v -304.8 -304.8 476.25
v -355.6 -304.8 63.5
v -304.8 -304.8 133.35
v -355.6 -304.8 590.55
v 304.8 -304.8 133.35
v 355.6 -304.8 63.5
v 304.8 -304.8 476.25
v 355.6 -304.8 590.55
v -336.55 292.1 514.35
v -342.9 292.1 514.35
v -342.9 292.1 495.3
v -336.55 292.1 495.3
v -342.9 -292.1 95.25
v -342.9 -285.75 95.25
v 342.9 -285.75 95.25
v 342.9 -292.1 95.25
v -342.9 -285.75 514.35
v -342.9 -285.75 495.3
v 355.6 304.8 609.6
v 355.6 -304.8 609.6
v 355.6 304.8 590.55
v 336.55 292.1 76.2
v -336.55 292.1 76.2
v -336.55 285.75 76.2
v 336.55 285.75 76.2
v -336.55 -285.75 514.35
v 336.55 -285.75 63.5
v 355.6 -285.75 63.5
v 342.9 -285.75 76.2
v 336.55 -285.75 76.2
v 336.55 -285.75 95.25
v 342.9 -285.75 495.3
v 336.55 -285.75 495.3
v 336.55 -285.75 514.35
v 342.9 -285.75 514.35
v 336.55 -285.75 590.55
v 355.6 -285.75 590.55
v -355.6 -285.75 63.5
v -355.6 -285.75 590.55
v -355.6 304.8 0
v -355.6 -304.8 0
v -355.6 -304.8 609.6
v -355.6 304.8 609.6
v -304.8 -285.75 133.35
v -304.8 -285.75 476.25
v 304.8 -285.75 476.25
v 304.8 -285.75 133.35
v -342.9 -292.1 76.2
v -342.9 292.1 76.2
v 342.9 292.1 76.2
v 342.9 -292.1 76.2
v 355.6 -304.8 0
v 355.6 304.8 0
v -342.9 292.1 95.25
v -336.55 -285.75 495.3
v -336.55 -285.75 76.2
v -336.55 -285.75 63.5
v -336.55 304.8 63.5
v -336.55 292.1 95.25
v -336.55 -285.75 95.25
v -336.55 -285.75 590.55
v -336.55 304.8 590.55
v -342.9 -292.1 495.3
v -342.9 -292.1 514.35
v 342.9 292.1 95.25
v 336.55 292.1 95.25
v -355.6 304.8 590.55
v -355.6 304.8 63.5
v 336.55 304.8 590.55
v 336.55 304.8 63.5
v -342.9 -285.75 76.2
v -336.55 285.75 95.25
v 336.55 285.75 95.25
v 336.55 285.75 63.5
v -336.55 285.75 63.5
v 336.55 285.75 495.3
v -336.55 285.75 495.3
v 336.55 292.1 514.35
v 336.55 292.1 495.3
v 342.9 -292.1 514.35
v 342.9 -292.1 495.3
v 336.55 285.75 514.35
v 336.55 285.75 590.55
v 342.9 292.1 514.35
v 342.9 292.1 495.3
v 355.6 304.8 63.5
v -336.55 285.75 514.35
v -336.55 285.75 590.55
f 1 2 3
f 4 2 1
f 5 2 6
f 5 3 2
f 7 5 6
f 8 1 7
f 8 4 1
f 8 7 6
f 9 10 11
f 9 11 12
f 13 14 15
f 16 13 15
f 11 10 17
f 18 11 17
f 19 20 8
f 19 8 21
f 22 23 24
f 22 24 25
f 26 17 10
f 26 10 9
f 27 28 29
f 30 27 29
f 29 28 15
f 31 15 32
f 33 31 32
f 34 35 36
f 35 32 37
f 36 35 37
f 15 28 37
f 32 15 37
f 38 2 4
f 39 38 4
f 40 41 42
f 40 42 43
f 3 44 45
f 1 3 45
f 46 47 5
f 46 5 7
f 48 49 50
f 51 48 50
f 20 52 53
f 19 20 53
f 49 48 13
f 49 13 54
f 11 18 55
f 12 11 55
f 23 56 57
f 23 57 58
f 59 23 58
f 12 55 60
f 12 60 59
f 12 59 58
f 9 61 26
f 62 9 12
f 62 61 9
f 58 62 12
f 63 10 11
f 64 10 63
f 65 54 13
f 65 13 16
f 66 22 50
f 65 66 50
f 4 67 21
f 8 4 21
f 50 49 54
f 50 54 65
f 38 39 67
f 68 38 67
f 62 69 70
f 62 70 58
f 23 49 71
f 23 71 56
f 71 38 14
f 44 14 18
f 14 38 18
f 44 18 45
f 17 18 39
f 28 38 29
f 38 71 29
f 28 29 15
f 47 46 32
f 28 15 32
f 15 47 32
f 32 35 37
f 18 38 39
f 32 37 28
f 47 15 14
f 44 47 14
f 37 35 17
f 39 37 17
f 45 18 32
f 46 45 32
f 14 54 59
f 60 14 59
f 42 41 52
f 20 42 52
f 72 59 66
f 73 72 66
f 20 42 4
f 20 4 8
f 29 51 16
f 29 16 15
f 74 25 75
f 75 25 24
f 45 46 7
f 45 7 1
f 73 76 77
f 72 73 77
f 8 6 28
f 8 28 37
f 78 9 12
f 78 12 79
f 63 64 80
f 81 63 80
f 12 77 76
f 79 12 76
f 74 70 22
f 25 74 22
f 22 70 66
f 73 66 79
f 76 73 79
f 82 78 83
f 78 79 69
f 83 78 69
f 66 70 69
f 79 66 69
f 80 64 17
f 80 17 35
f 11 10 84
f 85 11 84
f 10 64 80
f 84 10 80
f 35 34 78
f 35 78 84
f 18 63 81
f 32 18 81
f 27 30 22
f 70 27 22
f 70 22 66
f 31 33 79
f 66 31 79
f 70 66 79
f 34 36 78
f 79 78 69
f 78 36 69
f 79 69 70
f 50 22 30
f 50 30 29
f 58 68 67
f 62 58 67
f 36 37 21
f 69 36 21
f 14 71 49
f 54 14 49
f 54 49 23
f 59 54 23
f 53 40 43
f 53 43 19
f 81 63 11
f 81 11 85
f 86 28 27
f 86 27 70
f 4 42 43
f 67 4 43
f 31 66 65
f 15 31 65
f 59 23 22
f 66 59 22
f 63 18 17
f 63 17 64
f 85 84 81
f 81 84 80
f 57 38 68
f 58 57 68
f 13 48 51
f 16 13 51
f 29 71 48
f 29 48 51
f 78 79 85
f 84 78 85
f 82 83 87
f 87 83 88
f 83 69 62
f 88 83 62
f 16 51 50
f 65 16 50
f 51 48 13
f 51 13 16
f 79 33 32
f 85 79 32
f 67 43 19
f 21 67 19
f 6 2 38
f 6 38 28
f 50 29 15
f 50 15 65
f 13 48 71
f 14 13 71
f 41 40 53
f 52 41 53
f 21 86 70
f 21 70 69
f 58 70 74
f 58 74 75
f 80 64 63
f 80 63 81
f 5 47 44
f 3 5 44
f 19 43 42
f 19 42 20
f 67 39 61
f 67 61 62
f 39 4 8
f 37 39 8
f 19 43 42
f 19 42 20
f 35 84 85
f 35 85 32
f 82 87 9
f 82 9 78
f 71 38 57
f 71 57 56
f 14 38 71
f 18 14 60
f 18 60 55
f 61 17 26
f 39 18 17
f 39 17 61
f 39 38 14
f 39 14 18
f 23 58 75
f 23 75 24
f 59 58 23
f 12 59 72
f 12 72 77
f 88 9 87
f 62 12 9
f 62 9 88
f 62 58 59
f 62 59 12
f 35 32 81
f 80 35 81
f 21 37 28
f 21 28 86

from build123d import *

# Parameters (mm, degrees)
F0_W      = 711.2
F0_H      = 609.6
F1_DEPTH  = 609.6
F2_W      = 711.2
F2_H      = 609.6
F3_DEPTH  = 19.05
F4_W      = 590.55
F4_H      = 527.05
F5_DEPTH  = 19.05
F7_W      = 711.2
F7_H      = 527.05
F8_DEPTH  = 19.05
F9_W      = 673.1
F9_H      = 527.05
F10_DEPTH = 19.05
F12_W     = 685.8000246048
F12_H     = 584.2000246048
F12_W_2   = 673.1
F12_H_2   = 571.5
F13_DEPTH = 19.05
F15_W     = 685.8
F15_H     = 584.2
F16_DEPTH = 19.05
F17_W     = 609.6
F17_H     = 342.9
F18_DEPTH = 19.05


with BuildPart() as f1:
    # F0 (on Top) → F1 (new body)
    with BuildSketch(Plane.XY):
        Rectangle(F0_W, F0_H)
    extrude(amount=F1_DEPTH)


with BuildPart() as f3:
    # F2 (on face) → F3 (new body)
    with BuildSketch(Plane.XY.offset(609.6)):
        Rectangle(F2_W, F2_H)
    extrude(amount=-F3_DEPTH)


with BuildPart() as f5:
    # F4 (on face) → F5 (new body)
    with BuildSketch(Plane.YZ.offset(355.6)):
        with Locations((9.525, 327.025)):
            Rectangle(F4_W, F4_H)
    extrude(amount=-F5_DEPTH)


with BuildPart() as f6_1:
    # F6: instance of F5
    add(f5.part.mirror(Plane.YZ))


with BuildPart() as f8:
    # F7 (on face) → F8 (new body)
    with BuildSketch(Plane.XZ.offset(304.8)):
        with Locations((0, 327.025)):
            Rectangle(F7_W, F7_H)
    extrude(amount=-F8_DEPTH)

    # F17 (on face) → F18 (cut, through all)
    with BuildSketch(Plane(origin=(0, -285.75, 0), x_dir=(-1, 0, 0), z_dir=(0, 1, 0))):
        with Locations((0, 304.8)):
            Rectangle(F17_W, F17_H)
    extrude(amount=-F18_DEPTH, mode=Mode.SUBTRACT)


with BuildPart() as f10:
    # F9 (on face) → F10 (new body)
    with BuildSketch(Plane(origin=(0, 304.8, 0), x_dir=(-1, 0, 0), z_dir=(0, 1, 0))):
        with Locations((0, 327.025)):
            Rectangle(F9_W, F9_H)
    extrude(amount=-F10_DEPTH)


with BuildPart() as f13:
    # F12 (on offset) → F13 (new body)
    with BuildSketch(Plane.XY.offset(76.2)):
        Rectangle(F12_W, F12_H)
        Rectangle(F12_W_2, F12_H_2, mode=Mode.SUBTRACT)
        Rectangle(F12_W_2, F12_H_2)
    extrude(amount=F13_DEPTH)


with BuildPart() as f16:
    # F15 (on offset) → F16 (new body)
    with BuildSketch(Plane(origin=(0, 0, 514.35), x_dir=(1, 0, 0), z_dir=(0, 0, -1))):
        Rectangle(F15_W, F15_H)
    extrude(amount=F16_DEPTH)


with BuildPart() as f10_1:
    add(f10.part)

    # F19: cut F13
    add(f13.part, mode=Mode.SUBTRACT)

    # F20: cut F16
    add(f16.part, mode=Mode.SUBTRACT)


with BuildPart() as f6_1_1:
    add(f6_1.part)

    # F19: cut F13
    add(f13.part, mode=Mode.SUBTRACT)

    # F20: cut F16
    add(f16.part, mode=Mode.SUBTRACT)


with BuildPart() as f8_1:
    add(f8.part)

    # F19: cut F13
    add(f13.part, mode=Mode.SUBTRACT)

    # F20: cut F16
    add(f16.part, mode=Mode.SUBTRACT)


with BuildPart() as f5_1:
    add(f5.part)

    # F19: cut F13
    add(f13.part, mode=Mode.SUBTRACT)

    # F20: cut F16
    add(f16.part, mode=Mode.SUBTRACT)


solid = Compound([f1.part, f3.part, f13.part, f16.part, f10_1.part, f6_1_1.part, f8_1.part, f5_1.part])
